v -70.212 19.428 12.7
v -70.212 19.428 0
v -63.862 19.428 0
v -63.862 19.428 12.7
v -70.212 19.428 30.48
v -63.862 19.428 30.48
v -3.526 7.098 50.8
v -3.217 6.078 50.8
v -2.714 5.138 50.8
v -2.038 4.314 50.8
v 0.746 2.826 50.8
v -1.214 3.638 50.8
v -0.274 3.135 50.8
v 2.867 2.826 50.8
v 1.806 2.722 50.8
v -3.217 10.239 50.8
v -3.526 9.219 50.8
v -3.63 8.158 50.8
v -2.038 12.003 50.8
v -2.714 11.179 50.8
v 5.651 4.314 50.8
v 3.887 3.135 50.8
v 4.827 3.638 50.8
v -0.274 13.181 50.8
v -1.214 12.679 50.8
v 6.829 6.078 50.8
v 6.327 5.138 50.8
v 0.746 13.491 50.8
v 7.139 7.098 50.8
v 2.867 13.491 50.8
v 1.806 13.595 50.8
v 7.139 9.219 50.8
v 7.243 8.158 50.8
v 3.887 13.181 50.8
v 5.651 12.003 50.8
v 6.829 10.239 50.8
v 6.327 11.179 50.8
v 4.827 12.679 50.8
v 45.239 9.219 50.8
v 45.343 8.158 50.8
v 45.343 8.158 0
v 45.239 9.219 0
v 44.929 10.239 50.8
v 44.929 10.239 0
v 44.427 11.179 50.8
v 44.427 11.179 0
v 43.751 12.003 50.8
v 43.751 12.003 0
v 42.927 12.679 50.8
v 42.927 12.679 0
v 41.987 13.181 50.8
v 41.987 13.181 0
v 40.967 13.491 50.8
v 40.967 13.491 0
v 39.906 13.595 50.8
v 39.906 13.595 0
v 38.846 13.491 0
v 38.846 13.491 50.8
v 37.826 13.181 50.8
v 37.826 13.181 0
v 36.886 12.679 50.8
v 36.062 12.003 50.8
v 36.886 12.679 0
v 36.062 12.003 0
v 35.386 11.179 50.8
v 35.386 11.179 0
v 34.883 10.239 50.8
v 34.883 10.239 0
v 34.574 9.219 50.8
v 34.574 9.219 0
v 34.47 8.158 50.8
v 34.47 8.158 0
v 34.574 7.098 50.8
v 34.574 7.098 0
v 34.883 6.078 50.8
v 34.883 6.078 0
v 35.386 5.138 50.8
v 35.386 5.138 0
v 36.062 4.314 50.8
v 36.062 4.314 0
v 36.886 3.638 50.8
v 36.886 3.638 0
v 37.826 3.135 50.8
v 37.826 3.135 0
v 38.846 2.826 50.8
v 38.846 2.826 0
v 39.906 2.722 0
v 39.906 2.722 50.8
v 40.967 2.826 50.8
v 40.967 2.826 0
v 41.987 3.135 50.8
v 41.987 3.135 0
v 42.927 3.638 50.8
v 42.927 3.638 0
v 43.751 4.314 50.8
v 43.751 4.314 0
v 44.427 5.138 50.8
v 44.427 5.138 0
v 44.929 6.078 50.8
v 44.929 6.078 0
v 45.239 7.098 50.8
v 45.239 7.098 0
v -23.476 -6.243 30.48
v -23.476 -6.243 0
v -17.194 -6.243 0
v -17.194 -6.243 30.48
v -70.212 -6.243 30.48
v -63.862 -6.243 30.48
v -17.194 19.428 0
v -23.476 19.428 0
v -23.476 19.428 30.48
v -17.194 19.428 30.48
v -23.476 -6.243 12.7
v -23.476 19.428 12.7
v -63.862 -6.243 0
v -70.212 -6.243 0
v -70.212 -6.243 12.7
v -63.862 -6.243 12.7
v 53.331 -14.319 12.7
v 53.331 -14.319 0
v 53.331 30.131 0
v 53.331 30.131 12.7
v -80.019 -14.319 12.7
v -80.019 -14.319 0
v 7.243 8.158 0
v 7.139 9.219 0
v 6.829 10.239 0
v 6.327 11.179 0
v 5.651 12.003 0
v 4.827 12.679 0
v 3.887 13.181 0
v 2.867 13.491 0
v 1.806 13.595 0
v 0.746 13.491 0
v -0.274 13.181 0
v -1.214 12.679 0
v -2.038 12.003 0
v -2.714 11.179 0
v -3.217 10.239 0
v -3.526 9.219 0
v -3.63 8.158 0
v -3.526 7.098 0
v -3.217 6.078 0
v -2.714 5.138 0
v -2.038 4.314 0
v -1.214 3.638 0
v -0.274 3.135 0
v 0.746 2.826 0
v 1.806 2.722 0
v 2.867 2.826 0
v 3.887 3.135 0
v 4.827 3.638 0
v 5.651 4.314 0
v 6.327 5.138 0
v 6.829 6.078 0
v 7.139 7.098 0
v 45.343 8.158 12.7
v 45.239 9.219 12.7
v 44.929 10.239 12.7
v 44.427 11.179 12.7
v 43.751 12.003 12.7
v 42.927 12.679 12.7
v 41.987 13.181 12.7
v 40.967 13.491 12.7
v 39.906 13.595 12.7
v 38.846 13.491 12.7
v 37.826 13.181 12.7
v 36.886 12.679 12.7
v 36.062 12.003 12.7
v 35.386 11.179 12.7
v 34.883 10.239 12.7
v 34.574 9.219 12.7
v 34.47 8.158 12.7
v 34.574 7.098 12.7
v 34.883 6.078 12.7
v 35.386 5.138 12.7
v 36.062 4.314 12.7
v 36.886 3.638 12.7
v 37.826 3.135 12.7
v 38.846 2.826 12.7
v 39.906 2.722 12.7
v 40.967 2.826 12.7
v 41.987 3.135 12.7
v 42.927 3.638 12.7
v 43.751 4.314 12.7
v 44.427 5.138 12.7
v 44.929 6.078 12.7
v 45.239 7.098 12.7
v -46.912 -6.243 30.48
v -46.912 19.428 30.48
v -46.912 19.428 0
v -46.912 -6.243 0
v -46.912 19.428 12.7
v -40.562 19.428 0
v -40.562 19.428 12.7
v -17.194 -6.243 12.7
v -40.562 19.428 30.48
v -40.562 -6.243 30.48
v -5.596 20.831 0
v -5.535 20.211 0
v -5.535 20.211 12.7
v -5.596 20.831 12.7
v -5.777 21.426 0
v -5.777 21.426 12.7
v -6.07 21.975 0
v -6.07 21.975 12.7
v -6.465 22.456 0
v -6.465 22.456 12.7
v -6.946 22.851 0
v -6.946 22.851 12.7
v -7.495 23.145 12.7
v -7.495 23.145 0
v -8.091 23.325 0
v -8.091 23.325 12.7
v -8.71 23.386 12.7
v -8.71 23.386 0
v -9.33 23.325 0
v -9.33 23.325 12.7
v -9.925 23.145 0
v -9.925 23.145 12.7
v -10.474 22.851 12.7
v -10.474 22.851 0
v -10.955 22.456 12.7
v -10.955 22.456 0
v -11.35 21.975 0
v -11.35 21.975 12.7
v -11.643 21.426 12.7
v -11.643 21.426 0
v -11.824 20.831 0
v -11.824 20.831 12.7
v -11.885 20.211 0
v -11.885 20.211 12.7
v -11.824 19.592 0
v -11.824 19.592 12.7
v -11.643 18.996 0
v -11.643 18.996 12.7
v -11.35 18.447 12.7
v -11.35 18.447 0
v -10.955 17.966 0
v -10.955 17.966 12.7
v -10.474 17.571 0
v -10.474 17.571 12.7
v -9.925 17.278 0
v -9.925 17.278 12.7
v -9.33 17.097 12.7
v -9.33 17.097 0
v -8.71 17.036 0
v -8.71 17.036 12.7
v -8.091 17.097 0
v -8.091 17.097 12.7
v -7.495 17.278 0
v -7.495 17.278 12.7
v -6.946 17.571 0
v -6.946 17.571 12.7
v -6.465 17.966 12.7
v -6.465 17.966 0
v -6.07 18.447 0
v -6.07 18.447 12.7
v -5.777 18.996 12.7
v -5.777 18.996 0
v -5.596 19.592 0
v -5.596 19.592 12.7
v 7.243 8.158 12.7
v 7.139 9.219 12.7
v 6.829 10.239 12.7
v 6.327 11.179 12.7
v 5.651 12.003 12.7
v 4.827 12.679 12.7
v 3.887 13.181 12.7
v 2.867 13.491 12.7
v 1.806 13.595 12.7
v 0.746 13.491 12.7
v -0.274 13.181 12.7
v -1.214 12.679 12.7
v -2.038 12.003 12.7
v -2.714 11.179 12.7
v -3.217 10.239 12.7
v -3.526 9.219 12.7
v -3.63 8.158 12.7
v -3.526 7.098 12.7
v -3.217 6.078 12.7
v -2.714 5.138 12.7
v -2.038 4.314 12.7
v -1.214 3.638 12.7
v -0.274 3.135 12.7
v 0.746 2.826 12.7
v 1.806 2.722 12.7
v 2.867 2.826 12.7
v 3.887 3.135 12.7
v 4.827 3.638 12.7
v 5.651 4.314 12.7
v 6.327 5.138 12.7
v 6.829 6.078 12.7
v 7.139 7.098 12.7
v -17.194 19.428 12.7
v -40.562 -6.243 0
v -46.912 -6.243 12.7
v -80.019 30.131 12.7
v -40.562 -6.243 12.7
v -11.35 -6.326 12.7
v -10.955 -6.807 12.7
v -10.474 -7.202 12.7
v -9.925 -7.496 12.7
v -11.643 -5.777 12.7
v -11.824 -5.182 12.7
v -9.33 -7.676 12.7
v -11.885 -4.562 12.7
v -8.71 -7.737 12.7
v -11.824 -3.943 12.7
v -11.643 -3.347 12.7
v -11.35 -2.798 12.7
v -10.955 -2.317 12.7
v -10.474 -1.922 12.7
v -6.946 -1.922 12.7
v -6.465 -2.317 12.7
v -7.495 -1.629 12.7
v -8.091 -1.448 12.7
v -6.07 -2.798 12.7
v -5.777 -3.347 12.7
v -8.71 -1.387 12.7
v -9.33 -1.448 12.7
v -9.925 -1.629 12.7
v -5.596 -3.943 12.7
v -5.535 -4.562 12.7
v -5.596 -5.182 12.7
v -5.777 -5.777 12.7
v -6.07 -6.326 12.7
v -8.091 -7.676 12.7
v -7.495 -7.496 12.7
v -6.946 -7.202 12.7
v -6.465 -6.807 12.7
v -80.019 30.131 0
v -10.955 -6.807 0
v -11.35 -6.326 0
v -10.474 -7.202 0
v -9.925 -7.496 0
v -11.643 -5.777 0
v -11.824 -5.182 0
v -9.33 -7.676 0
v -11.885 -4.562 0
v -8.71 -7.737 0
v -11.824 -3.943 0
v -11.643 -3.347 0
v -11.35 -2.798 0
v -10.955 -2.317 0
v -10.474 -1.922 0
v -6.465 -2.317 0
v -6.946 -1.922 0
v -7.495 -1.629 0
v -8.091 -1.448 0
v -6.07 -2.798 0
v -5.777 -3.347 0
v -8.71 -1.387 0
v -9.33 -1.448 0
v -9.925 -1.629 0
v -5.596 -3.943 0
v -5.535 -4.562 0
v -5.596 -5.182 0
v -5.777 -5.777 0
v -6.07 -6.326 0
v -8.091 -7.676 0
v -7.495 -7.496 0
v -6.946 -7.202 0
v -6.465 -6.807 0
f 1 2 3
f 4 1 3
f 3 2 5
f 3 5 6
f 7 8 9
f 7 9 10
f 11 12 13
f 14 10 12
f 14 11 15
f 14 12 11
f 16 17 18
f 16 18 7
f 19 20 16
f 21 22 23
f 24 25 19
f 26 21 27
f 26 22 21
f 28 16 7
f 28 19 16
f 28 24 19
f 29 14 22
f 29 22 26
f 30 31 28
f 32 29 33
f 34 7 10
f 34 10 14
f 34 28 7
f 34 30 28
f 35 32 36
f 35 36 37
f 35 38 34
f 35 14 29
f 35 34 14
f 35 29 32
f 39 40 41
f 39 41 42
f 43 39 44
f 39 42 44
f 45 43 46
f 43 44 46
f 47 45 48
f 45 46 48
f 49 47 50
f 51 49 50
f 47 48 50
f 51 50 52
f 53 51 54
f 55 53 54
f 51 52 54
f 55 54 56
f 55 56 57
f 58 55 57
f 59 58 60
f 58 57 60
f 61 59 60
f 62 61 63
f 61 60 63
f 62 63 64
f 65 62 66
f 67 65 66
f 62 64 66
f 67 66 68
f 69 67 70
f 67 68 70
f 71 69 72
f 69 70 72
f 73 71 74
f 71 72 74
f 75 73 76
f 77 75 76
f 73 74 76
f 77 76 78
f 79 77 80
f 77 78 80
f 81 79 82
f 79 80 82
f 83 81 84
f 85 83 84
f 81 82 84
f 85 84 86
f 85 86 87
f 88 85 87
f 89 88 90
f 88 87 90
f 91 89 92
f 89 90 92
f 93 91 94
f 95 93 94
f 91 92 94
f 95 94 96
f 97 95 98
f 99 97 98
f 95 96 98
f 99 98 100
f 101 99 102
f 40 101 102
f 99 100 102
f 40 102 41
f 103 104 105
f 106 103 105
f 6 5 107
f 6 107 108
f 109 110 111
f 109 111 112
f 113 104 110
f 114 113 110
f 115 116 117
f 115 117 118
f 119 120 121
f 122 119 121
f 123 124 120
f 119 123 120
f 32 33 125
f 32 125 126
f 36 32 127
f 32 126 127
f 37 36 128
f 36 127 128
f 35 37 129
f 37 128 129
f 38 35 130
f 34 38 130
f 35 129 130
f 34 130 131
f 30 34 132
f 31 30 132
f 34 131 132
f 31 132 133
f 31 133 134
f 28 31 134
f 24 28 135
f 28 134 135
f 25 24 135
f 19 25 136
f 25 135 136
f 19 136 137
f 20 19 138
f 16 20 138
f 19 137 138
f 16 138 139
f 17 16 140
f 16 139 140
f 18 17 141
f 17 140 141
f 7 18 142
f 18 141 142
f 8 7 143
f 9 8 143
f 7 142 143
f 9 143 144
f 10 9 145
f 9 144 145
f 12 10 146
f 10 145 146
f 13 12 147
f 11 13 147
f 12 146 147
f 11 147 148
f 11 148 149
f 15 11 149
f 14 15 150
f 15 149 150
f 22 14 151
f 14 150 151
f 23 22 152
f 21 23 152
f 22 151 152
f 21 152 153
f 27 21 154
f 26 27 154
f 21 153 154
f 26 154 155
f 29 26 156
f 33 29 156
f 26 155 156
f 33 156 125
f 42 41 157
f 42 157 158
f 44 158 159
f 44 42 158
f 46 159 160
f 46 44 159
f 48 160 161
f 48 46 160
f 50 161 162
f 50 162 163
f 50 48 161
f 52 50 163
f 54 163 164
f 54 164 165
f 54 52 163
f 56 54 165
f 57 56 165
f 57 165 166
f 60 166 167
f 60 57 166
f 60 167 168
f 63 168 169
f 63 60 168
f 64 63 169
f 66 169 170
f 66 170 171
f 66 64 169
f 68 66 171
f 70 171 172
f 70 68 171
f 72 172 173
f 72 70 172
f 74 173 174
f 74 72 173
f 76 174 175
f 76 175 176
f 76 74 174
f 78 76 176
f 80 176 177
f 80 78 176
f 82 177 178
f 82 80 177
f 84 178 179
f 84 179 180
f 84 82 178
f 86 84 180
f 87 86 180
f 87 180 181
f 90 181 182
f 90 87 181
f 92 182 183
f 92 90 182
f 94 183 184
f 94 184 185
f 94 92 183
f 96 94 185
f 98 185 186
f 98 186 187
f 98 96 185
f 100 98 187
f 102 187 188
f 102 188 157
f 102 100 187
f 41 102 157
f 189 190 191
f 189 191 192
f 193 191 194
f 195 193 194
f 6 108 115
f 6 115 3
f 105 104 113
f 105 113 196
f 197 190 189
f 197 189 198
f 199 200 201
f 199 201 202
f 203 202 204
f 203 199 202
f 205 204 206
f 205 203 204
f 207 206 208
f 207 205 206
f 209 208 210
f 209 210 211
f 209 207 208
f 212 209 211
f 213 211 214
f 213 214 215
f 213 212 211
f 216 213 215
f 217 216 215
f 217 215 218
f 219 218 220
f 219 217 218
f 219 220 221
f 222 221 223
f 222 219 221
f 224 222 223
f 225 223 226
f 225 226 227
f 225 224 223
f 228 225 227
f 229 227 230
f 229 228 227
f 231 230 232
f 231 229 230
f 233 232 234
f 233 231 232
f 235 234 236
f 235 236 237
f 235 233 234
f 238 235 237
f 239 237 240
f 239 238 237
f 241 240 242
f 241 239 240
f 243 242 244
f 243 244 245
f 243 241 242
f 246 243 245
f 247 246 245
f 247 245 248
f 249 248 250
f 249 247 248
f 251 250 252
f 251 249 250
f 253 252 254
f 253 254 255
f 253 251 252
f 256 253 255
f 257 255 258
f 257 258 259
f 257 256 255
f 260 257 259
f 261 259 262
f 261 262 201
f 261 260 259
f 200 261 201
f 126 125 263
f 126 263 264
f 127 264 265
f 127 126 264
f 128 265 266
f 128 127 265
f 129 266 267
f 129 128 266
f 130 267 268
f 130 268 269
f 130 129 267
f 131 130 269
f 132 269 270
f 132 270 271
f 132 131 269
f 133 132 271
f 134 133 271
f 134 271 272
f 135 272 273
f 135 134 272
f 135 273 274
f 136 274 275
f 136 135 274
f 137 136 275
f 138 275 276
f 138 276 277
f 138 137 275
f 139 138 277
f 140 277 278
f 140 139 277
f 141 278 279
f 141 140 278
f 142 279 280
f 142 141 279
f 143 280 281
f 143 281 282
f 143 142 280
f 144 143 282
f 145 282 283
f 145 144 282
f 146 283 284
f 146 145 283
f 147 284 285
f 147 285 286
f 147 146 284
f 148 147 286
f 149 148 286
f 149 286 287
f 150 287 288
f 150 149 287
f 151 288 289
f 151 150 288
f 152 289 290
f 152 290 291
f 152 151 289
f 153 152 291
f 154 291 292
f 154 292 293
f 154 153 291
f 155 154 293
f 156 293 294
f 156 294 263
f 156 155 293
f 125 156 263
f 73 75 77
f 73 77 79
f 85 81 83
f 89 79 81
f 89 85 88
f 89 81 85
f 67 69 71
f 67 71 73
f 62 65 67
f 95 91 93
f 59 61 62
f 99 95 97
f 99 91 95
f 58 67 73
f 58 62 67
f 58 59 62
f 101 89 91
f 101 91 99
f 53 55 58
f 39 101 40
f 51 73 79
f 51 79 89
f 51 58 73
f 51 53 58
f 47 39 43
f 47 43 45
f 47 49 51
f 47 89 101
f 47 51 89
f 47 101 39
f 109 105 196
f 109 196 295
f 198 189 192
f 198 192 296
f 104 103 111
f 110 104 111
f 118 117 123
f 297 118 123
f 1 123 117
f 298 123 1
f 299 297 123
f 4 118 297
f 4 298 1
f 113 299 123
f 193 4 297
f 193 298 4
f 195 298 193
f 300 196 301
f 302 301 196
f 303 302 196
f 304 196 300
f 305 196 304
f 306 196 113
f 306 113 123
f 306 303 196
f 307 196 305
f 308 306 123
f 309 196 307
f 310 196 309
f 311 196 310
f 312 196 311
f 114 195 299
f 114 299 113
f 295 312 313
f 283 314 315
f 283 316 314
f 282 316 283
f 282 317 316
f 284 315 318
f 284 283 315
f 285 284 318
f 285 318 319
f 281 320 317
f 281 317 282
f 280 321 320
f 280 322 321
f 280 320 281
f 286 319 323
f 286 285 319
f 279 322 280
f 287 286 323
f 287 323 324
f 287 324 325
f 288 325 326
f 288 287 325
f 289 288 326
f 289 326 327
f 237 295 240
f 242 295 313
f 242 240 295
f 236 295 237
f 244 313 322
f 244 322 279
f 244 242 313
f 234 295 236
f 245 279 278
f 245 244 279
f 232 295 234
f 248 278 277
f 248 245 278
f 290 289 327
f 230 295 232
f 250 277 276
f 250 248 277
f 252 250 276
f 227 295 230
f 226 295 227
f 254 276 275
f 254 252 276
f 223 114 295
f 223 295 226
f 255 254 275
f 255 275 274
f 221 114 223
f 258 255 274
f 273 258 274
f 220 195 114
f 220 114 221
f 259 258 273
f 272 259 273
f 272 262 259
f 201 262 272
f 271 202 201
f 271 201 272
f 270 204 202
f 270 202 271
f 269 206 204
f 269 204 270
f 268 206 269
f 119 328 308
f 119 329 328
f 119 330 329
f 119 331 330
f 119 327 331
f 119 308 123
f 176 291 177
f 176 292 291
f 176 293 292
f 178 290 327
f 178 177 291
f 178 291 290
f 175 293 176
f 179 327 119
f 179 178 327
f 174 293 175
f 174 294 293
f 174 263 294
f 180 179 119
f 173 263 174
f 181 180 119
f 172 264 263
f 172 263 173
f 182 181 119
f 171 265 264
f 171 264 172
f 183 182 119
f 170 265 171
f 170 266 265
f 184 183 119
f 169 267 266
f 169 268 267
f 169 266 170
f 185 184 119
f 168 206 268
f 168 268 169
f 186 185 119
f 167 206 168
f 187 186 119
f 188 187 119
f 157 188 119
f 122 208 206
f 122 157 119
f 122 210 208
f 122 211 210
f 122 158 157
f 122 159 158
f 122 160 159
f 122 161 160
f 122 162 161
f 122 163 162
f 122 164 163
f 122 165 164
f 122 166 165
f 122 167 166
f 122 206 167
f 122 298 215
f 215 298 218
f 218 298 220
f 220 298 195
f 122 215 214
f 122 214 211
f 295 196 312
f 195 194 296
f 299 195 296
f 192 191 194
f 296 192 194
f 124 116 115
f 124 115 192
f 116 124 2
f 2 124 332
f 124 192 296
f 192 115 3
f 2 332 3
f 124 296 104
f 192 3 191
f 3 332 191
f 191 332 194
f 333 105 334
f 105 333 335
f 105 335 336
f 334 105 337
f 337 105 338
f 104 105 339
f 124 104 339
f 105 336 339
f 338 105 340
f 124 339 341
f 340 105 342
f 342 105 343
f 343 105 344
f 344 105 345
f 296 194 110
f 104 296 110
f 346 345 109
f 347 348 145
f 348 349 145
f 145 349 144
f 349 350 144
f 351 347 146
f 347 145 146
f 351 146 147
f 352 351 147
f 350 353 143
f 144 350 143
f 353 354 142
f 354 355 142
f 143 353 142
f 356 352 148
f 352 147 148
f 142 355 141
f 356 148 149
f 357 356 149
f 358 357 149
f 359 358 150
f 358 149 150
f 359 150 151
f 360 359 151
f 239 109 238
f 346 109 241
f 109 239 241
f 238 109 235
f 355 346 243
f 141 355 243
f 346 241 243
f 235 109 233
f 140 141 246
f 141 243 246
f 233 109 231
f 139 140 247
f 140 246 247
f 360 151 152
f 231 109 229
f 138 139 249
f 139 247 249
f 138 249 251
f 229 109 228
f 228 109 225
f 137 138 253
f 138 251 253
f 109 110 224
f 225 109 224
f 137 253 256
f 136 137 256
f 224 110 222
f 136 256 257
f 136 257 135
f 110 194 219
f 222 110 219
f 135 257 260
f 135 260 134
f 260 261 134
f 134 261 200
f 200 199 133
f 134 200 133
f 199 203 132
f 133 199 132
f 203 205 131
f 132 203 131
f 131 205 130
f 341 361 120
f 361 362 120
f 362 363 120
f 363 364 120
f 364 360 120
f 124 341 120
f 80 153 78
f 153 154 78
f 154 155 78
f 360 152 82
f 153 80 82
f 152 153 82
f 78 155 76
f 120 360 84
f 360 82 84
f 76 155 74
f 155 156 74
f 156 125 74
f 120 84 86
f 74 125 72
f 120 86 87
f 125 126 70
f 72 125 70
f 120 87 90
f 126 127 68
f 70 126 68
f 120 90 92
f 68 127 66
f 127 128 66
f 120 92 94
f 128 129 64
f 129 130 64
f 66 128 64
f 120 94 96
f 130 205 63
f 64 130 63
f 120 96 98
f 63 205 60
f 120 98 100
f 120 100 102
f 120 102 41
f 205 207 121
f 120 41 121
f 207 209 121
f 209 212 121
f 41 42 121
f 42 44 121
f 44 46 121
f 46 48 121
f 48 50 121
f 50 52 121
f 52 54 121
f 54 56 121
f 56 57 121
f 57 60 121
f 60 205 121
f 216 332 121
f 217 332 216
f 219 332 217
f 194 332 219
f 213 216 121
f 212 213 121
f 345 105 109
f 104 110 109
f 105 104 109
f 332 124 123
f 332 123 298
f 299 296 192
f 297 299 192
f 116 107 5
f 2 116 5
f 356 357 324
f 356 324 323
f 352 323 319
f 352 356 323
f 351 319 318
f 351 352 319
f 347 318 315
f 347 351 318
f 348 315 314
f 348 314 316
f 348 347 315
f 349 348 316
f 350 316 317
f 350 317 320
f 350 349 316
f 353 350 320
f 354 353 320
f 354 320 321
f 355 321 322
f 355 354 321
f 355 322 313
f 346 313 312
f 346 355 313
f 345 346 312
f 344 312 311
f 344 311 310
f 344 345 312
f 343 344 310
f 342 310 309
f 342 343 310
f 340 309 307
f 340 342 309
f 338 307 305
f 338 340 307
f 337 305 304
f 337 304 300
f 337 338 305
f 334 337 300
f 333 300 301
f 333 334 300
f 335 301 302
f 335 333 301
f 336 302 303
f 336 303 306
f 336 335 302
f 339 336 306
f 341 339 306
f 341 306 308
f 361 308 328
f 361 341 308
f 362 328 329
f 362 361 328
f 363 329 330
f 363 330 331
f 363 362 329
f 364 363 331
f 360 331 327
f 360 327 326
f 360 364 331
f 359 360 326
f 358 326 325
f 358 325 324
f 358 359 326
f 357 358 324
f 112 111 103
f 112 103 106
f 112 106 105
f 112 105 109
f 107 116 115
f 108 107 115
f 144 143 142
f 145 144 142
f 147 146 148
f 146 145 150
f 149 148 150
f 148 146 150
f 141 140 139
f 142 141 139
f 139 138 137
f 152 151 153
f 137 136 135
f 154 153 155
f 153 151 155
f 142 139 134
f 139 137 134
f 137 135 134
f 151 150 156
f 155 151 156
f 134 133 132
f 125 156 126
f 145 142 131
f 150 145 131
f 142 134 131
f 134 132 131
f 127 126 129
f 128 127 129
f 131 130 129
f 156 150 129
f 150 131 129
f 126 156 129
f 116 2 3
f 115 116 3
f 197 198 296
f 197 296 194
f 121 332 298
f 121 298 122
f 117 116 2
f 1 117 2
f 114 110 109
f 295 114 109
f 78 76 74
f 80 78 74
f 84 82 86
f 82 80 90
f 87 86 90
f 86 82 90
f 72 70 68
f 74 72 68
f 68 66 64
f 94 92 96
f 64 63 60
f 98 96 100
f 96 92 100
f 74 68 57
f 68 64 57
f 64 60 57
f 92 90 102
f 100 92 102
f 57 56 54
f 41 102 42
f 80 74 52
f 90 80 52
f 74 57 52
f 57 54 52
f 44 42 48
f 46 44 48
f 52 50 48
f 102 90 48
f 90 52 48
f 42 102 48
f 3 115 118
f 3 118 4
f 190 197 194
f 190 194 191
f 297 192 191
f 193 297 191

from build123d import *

# Parameters (mm, degrees)
F0_W     = 6.35
F0_H     = 25.671218
F0_W_2   = 6.282151
F1_DEPTH = 30.48
F0_R     = 5.436768
F2_DEPTH = 50.8
F0_W_3   = 133.35
F0_H_2   = 44.45
F0_R_2   = 3.175
F3_DEPTH = 12.7


with BuildPart() as f1:
    # F0 (on Top) → F1 (new body)
    with BuildSketch(Plane.XY):
        with Locations((-67.037499, 6.592832)):
            Rectangle(F0_W, F0_H)
        Polygon((-40.562348, 19.428441), (-46.844499, 19.428441), (-46.912348, 19.428441), (-46.912348, -6.242777), (-46.844499, -6.242777), (-40.562348, -6.242777), align=None)
        with Locations((-20.335423, 6.592832)):
            Rectangle(F0_W_2, F0_H)
    extrude(amount=F1_DEPTH)


with BuildPart() as f2:
    # F0 (on Top) → F2 (new body)
    with BuildSketch(Plane.XY):
        with Locations((1.806316, 8.158335)):
            Circle(F0_R)
        with Locations((39.906316, 8.158335)):
            Circle(F0_R)
    extrude(amount=F2_DEPTH)


with BuildPart() as f3:
    # F0 (on Top) → F3 (new body)
    with BuildSketch(Plane.XY):
        with Locations((-13.344483, 7.905885)):
            Rectangle(F0_W_3, F0_H_2)
        with Locations((-67.037499, 6.592832)):
            Rectangle(F0_W, F0_H, mode=Mode.SUBTRACT)
        Polygon((-46.912348, 19.428441), (-46.844499, 19.428441), (-40.562348, 19.428441), (-40.562348, -6.242777), (-46.844499, -6.242777), (-46.912348, -6.242777), align=None, mode=Mode.SUBTRACT)
        with Locations((-20.335423, 6.592832)):
            Rectangle(F0_W_2, F0_H, mode=Mode.SUBTRACT)
        with Locations((-8.710167, -4.562242)):
            Circle(F0_R_2, mode=Mode.SUBTRACT)
        with Locations((1.806316, 8.158335)):
            Circle(F0_R, mode=Mode.SUBTRACT)
        with Locations((39.906316, 8.158335)):
            Circle(F0_R, mode=Mode.SUBTRACT)
        with Locations((-8.710167, 20.211201)):
            Circle(F0_R_2, mode=Mode.SUBTRACT)
    extrude(amount=F3_DEPTH)


solid = Compound([f1.part, f2.part, f3.part])
